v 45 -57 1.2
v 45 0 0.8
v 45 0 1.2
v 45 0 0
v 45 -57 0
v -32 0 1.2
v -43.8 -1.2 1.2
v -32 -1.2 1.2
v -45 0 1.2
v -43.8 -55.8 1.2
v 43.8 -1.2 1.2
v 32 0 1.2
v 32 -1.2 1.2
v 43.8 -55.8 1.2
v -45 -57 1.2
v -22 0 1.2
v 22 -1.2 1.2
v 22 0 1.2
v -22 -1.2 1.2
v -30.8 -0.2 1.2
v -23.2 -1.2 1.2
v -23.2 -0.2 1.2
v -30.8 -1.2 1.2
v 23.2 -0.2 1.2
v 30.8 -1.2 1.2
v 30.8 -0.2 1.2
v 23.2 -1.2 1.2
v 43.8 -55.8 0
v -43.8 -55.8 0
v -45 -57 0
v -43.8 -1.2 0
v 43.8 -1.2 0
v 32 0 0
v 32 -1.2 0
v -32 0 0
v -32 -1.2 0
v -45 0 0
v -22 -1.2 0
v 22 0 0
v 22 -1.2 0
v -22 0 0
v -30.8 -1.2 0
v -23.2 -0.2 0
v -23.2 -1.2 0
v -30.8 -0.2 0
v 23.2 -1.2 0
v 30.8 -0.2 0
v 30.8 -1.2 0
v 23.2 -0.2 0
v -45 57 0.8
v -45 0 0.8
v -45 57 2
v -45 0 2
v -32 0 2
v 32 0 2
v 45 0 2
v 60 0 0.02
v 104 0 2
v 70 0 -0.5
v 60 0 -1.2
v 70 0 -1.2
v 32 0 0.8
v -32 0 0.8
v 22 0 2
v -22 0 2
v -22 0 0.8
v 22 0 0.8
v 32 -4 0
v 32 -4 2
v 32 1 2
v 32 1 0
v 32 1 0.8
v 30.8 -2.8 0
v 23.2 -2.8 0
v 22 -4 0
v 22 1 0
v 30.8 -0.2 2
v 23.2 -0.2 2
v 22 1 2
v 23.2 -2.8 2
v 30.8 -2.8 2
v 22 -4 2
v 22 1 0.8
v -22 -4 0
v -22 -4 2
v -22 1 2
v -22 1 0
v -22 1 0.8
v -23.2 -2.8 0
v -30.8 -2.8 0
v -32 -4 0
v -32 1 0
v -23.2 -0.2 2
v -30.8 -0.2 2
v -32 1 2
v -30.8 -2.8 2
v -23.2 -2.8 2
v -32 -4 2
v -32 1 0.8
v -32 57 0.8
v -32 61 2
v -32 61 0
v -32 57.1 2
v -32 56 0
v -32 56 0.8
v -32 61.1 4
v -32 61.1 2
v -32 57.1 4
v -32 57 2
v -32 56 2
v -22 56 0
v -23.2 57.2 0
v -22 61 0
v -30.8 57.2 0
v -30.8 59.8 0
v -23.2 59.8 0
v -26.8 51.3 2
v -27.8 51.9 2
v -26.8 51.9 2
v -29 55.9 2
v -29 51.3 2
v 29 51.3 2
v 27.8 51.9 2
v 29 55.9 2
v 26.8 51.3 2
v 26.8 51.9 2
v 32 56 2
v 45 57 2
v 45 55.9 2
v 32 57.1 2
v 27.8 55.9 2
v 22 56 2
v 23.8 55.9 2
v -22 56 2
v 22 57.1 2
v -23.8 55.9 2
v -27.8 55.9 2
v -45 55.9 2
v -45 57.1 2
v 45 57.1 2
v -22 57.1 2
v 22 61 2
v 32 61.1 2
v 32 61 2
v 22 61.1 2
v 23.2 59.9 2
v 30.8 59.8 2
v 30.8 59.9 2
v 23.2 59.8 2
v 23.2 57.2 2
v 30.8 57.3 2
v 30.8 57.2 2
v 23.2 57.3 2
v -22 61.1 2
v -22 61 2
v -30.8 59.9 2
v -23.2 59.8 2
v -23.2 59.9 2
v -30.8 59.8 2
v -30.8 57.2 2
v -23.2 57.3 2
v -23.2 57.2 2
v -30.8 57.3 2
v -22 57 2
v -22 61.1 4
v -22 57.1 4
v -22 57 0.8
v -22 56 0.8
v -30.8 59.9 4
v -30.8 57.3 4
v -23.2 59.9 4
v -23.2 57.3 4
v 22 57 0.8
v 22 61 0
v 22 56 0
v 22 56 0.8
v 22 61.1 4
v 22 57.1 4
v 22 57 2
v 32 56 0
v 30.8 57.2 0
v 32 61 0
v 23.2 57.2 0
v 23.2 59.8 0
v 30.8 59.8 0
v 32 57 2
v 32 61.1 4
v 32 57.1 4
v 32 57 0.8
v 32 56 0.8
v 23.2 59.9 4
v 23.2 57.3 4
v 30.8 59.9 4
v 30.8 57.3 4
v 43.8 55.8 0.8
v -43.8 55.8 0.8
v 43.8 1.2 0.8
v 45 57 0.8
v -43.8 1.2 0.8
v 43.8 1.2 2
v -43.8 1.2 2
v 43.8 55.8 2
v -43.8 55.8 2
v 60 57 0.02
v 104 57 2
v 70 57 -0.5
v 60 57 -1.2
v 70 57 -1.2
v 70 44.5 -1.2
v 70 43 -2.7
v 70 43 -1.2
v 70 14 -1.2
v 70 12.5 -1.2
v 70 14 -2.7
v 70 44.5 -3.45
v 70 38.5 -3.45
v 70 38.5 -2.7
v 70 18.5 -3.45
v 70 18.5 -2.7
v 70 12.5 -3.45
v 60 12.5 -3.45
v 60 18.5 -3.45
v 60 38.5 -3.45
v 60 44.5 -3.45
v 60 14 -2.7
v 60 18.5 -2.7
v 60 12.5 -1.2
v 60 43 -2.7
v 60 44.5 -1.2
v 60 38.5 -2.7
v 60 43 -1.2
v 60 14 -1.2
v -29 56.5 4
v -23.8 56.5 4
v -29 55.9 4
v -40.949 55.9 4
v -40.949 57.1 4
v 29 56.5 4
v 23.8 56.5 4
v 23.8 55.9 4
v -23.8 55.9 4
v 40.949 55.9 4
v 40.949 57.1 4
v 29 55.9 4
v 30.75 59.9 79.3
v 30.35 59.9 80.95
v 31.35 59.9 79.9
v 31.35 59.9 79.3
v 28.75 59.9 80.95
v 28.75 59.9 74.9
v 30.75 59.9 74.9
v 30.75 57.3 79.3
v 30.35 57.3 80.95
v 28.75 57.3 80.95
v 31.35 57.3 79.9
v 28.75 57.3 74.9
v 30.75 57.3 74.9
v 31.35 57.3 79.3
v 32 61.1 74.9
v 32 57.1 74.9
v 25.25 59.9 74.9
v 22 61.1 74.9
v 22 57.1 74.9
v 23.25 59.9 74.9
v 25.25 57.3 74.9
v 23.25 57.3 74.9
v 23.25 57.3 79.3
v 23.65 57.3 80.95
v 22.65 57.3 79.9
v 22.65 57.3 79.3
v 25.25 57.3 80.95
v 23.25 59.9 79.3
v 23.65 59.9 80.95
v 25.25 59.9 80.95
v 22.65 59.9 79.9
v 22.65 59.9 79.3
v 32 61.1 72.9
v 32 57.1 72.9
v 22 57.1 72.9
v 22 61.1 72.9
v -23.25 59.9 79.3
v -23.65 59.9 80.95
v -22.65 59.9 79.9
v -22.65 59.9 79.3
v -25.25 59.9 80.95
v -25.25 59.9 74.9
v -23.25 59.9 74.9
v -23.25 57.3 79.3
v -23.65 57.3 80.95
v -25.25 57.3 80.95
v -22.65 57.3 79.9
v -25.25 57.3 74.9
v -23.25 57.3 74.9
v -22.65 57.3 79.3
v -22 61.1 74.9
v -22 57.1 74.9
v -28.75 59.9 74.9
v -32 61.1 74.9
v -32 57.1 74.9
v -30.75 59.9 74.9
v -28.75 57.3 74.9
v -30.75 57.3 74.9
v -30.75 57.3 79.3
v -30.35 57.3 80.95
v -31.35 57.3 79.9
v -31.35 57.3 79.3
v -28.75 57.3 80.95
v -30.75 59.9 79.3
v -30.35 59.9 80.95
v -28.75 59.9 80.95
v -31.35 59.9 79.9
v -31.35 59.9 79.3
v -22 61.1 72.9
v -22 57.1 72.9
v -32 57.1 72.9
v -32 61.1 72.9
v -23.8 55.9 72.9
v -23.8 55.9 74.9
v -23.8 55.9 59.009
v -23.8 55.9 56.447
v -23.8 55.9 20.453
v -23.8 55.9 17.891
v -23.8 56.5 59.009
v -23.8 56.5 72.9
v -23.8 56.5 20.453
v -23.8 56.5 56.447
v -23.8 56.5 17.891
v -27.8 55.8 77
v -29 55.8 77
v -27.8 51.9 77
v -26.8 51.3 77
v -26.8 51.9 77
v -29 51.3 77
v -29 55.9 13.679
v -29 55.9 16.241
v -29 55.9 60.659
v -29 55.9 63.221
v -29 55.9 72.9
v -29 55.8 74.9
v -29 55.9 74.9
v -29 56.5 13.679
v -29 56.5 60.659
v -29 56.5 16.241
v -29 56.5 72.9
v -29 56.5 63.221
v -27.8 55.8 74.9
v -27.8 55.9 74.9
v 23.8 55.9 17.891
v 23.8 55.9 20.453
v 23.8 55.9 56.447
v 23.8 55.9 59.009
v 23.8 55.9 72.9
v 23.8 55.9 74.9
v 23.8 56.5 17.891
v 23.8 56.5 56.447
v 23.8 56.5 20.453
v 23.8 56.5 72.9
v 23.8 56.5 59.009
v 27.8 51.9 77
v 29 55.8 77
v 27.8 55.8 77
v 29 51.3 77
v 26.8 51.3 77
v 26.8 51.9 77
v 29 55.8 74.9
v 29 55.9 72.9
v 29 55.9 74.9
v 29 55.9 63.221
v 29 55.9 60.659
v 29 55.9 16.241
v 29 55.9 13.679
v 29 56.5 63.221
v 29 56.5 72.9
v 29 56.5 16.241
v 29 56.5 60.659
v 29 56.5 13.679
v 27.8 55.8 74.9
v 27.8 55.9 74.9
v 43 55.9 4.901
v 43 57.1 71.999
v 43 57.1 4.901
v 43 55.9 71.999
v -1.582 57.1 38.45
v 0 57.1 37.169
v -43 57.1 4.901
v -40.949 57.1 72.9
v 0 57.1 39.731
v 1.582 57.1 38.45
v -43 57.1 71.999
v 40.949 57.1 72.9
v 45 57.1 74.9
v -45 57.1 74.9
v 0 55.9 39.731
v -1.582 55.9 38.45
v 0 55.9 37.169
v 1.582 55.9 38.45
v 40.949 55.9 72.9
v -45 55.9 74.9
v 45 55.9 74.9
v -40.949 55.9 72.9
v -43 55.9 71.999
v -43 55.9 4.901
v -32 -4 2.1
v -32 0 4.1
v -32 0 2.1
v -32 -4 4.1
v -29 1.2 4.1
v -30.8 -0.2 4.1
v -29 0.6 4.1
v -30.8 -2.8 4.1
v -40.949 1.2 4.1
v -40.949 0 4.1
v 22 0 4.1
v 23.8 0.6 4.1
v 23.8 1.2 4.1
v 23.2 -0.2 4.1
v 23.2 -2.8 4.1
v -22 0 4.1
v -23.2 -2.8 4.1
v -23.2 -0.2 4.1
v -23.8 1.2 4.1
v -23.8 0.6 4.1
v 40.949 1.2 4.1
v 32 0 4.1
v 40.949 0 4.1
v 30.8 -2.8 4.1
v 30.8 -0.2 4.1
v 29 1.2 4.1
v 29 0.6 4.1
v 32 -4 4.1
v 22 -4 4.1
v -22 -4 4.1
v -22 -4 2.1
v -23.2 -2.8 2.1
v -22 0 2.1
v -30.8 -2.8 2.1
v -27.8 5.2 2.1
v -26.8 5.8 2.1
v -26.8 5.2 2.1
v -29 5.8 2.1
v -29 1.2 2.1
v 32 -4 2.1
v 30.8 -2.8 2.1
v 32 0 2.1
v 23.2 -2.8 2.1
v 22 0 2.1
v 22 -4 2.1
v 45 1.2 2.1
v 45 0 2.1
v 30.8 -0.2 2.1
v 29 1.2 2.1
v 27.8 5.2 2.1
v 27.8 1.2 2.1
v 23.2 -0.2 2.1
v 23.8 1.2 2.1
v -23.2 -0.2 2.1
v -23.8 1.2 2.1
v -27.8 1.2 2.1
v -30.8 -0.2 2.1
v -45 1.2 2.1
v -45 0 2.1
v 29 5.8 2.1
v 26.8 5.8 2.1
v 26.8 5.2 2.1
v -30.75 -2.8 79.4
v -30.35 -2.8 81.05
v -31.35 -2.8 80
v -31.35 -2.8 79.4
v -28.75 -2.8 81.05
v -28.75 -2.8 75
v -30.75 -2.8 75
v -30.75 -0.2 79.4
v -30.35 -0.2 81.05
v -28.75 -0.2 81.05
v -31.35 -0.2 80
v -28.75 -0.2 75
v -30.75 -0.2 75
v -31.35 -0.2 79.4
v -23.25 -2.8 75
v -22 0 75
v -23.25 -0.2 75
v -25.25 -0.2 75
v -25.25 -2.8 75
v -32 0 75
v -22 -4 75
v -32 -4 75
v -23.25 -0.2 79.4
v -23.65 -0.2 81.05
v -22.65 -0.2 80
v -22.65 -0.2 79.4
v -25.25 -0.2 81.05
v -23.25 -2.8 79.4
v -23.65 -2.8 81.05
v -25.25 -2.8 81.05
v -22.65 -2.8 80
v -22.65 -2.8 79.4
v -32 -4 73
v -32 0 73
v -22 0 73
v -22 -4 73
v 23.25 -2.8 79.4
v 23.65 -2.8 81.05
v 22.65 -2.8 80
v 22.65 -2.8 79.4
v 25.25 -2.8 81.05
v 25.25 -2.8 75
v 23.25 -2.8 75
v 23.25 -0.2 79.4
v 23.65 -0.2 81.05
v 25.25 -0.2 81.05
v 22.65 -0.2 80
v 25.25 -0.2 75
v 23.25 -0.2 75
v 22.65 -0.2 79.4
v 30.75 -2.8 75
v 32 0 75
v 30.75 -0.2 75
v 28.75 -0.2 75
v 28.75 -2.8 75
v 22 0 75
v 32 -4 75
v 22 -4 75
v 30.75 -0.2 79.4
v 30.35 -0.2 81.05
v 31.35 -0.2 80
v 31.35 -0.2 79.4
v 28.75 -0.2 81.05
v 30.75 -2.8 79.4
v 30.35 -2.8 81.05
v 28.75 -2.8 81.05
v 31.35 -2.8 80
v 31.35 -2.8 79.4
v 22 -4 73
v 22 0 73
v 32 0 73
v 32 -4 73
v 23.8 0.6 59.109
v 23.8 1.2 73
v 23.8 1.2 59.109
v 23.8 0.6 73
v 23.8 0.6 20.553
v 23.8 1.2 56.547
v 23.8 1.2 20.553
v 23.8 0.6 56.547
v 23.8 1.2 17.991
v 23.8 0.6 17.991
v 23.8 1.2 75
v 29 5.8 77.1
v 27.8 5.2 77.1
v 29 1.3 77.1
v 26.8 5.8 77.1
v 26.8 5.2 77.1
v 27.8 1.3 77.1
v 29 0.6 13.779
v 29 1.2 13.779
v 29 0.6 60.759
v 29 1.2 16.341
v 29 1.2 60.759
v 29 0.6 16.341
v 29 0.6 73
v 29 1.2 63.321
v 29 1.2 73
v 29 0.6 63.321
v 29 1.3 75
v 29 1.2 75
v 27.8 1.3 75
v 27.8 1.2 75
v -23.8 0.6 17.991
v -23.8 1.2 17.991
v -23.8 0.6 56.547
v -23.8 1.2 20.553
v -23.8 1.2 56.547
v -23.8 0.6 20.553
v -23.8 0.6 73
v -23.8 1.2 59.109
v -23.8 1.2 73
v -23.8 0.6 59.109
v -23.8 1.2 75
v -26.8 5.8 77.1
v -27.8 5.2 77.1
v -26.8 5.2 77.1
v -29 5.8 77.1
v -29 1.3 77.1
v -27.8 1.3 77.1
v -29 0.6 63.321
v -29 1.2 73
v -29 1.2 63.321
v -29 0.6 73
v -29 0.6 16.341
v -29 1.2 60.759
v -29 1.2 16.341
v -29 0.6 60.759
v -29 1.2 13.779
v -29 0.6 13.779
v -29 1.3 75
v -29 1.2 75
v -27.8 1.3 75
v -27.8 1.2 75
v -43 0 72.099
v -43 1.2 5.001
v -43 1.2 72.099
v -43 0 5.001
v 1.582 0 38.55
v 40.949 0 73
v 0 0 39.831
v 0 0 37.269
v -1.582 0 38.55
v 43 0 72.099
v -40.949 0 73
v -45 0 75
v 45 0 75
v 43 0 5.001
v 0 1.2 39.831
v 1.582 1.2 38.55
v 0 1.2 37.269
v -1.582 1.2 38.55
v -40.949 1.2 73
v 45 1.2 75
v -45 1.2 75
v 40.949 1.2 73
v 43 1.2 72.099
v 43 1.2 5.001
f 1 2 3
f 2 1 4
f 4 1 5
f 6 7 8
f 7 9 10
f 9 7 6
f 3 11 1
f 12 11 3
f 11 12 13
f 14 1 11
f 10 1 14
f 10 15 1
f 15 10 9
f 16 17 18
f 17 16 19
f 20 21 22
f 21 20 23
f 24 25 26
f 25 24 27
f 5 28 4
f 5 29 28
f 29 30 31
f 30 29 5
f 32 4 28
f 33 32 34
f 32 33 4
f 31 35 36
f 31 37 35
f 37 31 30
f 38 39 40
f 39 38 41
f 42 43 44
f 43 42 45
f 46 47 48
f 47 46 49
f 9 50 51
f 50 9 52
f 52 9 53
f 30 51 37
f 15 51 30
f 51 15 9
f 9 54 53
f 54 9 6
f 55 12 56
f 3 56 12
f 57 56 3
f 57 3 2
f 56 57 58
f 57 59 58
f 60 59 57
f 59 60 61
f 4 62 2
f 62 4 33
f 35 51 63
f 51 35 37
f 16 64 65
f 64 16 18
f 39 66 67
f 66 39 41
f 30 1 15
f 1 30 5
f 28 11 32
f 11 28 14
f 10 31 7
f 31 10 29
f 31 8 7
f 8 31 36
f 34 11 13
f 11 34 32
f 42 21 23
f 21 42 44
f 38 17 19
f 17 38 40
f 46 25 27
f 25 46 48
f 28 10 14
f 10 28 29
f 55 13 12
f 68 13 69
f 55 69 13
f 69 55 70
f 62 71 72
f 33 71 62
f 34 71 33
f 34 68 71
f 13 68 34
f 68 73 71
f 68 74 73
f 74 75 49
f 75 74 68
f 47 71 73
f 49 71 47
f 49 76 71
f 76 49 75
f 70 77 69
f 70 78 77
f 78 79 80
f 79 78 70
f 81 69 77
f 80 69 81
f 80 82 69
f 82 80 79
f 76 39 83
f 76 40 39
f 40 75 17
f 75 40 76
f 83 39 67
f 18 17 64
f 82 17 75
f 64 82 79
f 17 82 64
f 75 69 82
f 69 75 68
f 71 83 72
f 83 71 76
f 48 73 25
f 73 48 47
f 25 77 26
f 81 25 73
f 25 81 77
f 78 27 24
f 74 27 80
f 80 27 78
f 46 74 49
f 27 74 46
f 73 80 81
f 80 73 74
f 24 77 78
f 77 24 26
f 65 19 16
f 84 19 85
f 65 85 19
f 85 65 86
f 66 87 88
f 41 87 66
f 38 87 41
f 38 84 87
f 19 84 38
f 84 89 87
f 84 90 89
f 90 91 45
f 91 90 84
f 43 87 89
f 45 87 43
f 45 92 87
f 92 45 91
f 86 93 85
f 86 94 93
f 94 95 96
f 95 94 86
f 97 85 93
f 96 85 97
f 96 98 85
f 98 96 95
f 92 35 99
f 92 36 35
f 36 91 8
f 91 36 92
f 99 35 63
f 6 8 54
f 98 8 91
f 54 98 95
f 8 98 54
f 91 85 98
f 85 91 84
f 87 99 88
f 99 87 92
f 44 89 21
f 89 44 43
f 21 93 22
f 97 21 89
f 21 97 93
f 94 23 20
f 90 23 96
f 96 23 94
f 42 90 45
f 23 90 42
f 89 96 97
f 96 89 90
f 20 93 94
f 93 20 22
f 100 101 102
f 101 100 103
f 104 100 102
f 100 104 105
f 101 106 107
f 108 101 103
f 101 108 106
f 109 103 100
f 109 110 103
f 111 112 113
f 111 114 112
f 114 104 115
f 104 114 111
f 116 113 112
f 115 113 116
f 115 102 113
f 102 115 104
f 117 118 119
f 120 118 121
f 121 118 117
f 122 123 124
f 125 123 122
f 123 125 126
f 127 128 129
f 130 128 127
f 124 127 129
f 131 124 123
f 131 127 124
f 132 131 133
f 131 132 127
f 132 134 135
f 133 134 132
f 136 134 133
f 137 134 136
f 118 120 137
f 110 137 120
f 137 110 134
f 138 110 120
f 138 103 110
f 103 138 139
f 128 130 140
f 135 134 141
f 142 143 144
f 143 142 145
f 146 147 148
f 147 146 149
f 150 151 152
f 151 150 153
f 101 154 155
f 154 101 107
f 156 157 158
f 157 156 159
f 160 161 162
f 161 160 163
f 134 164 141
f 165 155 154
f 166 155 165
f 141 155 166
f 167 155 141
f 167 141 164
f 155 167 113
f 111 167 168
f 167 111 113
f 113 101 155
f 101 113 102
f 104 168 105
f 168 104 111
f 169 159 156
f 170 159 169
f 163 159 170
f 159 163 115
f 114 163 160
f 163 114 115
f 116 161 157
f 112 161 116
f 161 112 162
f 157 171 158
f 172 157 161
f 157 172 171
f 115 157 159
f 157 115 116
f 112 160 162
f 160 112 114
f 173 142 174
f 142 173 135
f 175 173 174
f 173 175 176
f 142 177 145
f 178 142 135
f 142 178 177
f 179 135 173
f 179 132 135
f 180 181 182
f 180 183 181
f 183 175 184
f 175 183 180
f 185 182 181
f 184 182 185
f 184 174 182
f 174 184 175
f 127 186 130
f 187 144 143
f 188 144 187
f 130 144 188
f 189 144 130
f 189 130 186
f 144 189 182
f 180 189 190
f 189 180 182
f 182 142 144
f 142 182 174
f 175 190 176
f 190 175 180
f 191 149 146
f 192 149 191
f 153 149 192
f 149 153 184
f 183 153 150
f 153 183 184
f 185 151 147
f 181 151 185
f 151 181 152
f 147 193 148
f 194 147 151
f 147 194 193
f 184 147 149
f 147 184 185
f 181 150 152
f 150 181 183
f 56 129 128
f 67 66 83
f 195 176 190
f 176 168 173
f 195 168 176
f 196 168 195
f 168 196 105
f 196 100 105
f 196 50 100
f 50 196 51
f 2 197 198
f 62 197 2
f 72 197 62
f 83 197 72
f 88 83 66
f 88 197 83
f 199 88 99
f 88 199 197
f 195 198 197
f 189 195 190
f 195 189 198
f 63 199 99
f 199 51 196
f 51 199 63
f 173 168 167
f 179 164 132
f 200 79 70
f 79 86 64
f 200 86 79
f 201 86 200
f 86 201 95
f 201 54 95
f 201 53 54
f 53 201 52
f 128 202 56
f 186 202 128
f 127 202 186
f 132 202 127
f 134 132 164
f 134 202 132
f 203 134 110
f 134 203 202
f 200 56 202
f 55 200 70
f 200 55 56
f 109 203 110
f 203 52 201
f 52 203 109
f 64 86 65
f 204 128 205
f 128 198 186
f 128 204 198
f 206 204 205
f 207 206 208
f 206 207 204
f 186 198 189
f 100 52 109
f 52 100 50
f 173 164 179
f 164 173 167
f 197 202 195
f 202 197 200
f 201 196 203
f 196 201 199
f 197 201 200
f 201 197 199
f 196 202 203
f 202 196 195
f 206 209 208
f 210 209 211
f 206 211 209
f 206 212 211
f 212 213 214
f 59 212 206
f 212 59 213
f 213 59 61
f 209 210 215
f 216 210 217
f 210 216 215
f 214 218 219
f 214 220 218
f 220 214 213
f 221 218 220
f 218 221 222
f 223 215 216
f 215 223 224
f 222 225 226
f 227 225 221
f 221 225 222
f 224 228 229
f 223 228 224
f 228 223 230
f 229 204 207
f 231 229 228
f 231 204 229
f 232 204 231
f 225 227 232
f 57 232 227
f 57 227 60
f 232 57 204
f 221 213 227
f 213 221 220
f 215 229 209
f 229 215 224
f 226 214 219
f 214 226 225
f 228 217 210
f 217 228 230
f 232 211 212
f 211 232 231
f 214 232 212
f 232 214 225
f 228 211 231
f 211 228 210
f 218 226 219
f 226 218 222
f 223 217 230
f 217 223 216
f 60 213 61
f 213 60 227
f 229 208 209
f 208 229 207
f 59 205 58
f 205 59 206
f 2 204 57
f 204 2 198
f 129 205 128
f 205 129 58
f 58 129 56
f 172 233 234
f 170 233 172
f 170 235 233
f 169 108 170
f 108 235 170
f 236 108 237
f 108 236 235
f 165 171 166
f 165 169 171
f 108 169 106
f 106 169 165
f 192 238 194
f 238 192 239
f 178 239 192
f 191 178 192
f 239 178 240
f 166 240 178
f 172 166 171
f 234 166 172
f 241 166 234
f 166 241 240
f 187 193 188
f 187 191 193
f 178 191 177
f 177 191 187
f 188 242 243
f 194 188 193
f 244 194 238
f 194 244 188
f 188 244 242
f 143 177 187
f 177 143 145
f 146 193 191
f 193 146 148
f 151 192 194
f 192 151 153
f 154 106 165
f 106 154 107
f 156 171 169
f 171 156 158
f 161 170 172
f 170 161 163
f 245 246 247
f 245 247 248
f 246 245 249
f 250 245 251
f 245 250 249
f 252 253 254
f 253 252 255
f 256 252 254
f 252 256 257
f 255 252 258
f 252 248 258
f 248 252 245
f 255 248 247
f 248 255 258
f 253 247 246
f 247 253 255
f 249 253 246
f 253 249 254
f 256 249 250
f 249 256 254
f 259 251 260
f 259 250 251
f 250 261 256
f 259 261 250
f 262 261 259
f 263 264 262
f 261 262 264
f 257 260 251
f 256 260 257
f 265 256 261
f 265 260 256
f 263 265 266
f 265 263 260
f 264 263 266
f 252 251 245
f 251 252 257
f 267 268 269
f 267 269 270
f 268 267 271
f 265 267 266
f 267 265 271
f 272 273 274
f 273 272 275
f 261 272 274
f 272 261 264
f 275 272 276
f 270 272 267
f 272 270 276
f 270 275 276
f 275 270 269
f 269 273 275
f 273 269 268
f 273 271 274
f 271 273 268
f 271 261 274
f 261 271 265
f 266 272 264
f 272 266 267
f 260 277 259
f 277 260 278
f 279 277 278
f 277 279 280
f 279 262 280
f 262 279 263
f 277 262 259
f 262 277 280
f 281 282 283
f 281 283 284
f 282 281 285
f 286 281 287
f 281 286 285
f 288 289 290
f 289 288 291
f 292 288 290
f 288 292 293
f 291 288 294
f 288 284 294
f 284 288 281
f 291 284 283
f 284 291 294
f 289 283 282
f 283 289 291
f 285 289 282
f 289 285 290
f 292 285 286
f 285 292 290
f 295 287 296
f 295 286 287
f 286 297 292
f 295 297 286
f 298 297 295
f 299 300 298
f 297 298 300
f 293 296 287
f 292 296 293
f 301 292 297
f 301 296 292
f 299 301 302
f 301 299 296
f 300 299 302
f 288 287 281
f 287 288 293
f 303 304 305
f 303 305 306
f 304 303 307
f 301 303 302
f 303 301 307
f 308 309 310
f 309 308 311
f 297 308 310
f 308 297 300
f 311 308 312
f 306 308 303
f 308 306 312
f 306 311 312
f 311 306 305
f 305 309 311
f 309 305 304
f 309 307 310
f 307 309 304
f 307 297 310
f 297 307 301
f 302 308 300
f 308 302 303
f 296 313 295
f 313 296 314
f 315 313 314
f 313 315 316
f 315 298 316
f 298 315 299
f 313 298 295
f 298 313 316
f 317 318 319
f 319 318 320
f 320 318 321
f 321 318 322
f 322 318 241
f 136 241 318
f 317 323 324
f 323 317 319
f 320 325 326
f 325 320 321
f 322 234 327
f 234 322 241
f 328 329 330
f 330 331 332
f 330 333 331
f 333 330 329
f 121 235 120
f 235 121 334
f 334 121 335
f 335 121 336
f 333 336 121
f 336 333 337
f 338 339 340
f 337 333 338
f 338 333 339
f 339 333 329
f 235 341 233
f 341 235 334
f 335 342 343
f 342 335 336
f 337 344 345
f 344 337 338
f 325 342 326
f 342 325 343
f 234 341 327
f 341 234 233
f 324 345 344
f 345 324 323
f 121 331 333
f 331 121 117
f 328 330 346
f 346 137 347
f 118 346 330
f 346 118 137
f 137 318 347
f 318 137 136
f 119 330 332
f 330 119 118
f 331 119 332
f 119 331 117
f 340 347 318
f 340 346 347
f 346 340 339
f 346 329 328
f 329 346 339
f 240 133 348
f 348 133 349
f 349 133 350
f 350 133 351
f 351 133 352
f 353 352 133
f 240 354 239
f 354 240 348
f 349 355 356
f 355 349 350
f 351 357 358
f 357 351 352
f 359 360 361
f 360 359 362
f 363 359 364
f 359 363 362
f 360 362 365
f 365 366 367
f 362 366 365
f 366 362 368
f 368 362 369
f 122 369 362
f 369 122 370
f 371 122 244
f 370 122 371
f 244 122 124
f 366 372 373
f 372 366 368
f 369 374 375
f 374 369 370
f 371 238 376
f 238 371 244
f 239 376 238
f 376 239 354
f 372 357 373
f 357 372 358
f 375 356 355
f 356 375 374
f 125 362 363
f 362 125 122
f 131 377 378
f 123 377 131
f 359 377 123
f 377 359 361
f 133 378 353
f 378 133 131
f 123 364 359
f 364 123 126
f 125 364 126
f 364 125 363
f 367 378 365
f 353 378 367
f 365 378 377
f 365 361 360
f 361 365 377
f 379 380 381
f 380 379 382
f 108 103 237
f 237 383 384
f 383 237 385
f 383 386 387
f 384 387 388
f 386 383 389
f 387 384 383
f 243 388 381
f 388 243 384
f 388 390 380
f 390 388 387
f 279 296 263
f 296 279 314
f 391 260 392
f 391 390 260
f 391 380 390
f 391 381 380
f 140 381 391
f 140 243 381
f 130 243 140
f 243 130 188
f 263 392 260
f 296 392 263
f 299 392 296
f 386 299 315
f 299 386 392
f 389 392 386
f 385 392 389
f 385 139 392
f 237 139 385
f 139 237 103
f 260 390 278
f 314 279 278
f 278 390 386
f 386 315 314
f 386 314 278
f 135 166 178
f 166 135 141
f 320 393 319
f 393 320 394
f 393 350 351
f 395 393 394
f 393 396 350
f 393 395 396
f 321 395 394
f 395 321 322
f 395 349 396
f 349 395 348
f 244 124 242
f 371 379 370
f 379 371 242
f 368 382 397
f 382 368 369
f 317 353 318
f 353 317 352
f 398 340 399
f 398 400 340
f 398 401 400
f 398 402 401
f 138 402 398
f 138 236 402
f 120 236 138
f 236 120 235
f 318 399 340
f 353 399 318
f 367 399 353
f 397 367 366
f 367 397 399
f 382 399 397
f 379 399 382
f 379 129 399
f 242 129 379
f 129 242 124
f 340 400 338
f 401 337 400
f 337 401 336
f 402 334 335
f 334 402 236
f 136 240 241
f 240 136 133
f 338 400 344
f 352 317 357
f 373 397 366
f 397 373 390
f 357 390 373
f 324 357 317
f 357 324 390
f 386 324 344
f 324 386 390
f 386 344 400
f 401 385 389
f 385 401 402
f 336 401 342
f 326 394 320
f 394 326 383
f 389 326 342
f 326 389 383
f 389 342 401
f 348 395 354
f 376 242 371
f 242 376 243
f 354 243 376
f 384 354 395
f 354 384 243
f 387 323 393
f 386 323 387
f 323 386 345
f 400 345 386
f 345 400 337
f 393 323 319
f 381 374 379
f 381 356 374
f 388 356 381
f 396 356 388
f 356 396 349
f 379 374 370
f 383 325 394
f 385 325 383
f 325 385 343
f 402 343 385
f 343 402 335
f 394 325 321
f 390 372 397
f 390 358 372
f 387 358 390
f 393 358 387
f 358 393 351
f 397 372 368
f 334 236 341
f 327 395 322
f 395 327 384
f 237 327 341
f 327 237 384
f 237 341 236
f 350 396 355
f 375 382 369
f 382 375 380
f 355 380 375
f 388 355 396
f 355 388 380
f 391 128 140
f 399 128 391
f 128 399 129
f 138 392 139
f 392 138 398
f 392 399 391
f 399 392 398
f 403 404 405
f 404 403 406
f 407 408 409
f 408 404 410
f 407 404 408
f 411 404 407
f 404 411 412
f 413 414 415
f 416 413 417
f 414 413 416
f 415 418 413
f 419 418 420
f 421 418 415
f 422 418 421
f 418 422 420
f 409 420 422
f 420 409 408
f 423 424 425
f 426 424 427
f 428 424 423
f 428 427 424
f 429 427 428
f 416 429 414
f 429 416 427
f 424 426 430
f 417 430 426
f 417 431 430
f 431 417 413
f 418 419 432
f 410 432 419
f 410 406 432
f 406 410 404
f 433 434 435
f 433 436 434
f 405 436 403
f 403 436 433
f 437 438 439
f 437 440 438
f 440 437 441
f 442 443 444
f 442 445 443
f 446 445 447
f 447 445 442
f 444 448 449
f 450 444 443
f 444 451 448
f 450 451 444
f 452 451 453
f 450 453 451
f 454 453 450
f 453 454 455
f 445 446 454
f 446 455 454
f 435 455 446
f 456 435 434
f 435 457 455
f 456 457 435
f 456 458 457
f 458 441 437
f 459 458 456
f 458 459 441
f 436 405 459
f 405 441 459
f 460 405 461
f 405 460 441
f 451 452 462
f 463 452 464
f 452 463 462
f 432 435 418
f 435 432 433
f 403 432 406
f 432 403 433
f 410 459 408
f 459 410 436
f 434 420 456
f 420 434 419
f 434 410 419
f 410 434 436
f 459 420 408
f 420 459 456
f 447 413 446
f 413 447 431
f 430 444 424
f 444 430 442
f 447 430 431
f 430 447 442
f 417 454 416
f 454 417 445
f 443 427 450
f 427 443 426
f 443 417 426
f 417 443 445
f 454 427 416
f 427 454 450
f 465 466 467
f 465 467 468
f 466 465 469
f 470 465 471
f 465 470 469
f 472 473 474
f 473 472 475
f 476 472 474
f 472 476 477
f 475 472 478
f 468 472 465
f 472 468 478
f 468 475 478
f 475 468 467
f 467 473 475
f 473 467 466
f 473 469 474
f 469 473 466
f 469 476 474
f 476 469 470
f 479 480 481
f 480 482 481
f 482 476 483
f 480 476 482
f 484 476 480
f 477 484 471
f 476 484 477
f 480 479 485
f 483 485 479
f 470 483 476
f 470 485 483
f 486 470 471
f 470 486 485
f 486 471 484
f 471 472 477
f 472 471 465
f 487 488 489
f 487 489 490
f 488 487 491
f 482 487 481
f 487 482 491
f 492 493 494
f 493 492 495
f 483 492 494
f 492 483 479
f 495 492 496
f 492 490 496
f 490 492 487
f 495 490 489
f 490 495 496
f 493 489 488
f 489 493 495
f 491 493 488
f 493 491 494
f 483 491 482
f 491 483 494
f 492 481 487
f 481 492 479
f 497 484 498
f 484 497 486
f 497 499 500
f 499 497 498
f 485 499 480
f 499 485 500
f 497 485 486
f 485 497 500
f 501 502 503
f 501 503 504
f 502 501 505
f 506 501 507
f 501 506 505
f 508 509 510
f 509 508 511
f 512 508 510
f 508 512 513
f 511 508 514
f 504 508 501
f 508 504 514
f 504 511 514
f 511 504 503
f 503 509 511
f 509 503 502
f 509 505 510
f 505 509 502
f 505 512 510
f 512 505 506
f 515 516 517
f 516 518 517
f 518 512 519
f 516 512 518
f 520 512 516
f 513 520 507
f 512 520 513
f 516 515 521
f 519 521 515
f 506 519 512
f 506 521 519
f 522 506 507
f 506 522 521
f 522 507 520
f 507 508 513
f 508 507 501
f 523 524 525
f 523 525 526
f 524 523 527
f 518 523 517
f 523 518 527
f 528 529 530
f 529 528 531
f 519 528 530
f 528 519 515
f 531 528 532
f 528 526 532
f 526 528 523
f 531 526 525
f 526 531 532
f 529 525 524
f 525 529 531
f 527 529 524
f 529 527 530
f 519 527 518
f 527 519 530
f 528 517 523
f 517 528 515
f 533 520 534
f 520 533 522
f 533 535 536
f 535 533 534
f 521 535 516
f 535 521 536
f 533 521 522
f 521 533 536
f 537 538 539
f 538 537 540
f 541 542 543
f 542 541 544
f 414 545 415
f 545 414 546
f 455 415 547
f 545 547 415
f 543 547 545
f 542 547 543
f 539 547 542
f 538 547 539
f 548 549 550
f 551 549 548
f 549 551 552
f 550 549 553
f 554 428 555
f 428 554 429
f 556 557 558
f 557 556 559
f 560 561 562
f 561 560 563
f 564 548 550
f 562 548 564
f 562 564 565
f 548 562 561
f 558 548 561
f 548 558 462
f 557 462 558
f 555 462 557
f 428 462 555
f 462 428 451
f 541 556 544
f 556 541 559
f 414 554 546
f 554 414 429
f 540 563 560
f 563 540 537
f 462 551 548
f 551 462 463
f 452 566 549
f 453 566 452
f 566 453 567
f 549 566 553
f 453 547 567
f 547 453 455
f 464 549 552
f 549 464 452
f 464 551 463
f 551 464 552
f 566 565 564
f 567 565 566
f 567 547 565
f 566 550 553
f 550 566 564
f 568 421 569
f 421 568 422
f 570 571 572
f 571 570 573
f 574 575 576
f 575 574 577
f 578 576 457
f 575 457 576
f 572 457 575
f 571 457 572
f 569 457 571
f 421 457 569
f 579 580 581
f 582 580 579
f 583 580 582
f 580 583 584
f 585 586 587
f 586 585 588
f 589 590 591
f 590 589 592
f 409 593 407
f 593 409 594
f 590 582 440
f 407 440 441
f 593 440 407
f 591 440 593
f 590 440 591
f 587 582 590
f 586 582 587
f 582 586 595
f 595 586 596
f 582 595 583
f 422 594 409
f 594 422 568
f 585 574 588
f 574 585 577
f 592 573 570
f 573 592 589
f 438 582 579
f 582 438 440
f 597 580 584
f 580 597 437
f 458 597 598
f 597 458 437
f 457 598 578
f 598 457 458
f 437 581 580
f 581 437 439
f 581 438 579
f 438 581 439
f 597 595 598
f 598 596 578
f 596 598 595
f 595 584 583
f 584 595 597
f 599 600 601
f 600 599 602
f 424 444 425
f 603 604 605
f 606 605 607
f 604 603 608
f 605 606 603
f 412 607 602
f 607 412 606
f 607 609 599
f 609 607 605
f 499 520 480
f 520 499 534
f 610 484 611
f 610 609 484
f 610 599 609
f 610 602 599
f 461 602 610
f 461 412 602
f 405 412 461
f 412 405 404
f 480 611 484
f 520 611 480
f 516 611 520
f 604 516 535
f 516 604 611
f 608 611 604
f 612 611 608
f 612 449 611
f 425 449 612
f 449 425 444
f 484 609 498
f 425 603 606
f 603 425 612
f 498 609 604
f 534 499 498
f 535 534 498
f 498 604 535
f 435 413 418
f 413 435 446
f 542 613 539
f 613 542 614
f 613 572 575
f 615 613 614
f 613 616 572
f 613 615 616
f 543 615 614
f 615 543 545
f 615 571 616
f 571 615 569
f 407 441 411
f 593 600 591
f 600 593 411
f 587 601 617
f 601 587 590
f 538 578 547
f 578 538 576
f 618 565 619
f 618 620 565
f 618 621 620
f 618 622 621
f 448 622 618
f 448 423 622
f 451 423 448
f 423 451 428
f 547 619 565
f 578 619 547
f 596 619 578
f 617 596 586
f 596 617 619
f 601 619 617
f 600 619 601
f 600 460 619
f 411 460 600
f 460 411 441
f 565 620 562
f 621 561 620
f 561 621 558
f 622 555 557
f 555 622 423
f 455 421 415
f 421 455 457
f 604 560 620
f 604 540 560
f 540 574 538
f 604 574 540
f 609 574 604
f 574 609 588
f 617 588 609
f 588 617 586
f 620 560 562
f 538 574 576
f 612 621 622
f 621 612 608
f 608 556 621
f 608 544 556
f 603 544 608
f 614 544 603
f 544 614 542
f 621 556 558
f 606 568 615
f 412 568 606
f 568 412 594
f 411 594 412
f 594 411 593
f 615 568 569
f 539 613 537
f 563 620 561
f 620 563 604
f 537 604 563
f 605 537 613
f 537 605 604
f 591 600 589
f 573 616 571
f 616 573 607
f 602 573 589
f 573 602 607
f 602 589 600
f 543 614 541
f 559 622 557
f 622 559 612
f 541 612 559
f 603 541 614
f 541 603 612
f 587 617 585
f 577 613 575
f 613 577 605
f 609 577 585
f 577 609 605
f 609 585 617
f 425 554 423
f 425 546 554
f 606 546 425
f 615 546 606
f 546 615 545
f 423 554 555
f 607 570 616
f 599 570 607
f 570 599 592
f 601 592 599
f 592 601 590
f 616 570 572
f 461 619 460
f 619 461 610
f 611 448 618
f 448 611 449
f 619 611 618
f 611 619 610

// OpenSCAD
module attachment(type="plug",extraL=0) {
    dim_x=10;
    dim_y=5;
    dim_z=2;
    e=.1/2;
    plug_z=dim_z+2;
    W=1.2;
    plug_w=2;
    plug_a=.6;
    plug_mid=dim_z+4*e+.2;
    
    module pole(){
        translate([plug_w,0,extraL])
        rotate(90,[1,0,0])
        color([0,1,0]){
            linear_extrude(height=dim_y-2*W,  slices=20, twist=0,center=true)
          polygon(points=[[0,-extraL],[0,plug_mid],[plug_a,plug_mid],
                    [plug_a,plug_z+e],
                    [plug_a,plug_z-1],
                    [plug_a-1,plug_z+e],
                    [-plug_w,plug_z+e],
                    [-plug_w,-extraL]
                ]);
            }
    }

if(true){
translate([0,dim_y/2,0])
    translate([0,-1,0])
    if(type == "plug"){
        k=dim_x/2-W-e-plug_w;
        translate([k,0,0])
        pole();
        translate([-k,0,0])
        rotate(180,[0,0,1])
        pole();
        translate([0,0,-dim_z/2])
        cube([dim_x,dim_y,dim_z],center=true);
    }else{
        color([1.0,0,0])
        translate([0,0,dim_z/2])
        difference() {
            cube([dim_x,dim_y,dim_z],center=true);
            cube([dim_x-2*W,dim_y-2*W,dim_z*2],center=true);
        }
    }
}   else{
    H=dim_z;
    D=5;
    SCREW_D=3;
    translate([0,D/3,H/2])
    difference() {
        hull() {
            cylinder($fn=6,d=D,h=H,center=true);
            translate([0,-D/3,0])
            cube([2*D,e,H],center=true);
        }
        cylinder($fn=32,d=SCREW_D,h=2*H,center=true);
    }
}    
}

//attach_O();
//a=2;

module testAttach() {
translate([0,2.5,1])
cube([10,4,2],center=true);
translate([0,0,2])
attachment("plug",2);

if(true) 
    {
translate([0,7,0])
attachment(2);
translate([0,-7,0])
attachment(2);
}
}


FLOOR=75;
e=.1;
STAGE_H=2;
K=57;
L=90;
W=1.2;
SA=L*.6/2;

RAIL_O=4;

module wallElement(){ 
    EH=FLOOR-e-STAGE_H;
    
    translate([SA,0,0])
    attachment("socket");
    translate([-SA,0,0])
    attachment("socket");
  
    
    translate([SA,0,EH])
    attachment("plug",STAGE_H);
    translate([-SA,0,EH])
    attachment("plug",STAGE_H);
    
    
    module rail(){
        translate([-RAIL_O/2,-RAIL_O-W/2,0])
//    rotate(180,[0,0,1])
        difference() {
        cube([RAIL_O+W,RAIL_O+W,FLOOR]);
        translate([W,W/2,-1])
        cube([2*SA,RAIL_O,FLOOR+STAGE_H]);
        translate([W+1,-1,-1])
        cube([2*SA,RAIL_O,FLOOR+STAGE_H]);
            translate([-.1,RAIL_O+W/2-.1,EH])
        cube([RAIL_O*2,RAIL_O,RAIL_O]);
    }

    }
    
    translate([-SA,-W,0])
    rail();

    translate([SA,-W,0])
    //rotate(180,[0,0,1])
    mirror([1,0,0])
    rail();

/*    
    translate([0,-W,0])
    rotate(180,[0,0,1])
    difference(){
    cube([RAIL_O+W,RAIL_O+W,FLOOR]);
    cube([RAIL_O,RAIL_O,2*FLOOR]);
    }
  */  
    p=  [
            [L/2,0,0],
            [L/2,EH,0],
            [-L/2,EH,0],
            [-L/2,0,0]];
    
    module rx(p,i,j,d) {
        $fn=32;
        hull() {
            translate(p[i]) cylinder(d=d,h=W);
            translate(p[j])cylinder(d=d,h=W);
        }
    }

    rotate(90,[1,0,0])
    intersection() {
        translate([-L/2,0,-10])
        cube([L,EH+eps*5,20]);
        union(){
            
    rx(p,0,1,4);
            hull(){
//            translate([0,W,-W*1.5])
    rx(p,1,2,4);
    rx(p,1,2,4);}
    rx(p,2,3,4);
    rx(p,3,0,4);
    rx(p,0,2,2);
    rx(p,1,3,2);
        }
    }
//    difference() {
//    linear_extrude(height=2) polygon(p);
  //  linear_extrude(center=true) offset(r=-1) polygon([p[0],p[1],p[2]]);
    //}
    
    
//    translate([
}
eps=1e-5;
module floorElement(){
    translate([SA,-eps,0])
    attachment("socket");
    translate([-SA,-eps,0])
    attachment("socket");
        
    translate([0,-K,0])
    rotate(180,[0,0,1]){
    translate([SA,-eps,0])
    attachment("socket");
    translate([-SA,-eps,0])
    attachment("socket");
    }
    
    translate([0,-K/2,W/2])
    difference(){
    cube([L,K,W],center=true);
    cube([L-2*W,K-2*W,W*5],center=true);
    }
    CONN_L0=10;
    CONN_L=25;

    CONN_H=2.5;
    CONN_T=34;
    
    translate([L/2,-K,0]) {
    color([1,0,1])
        difference() {
            pp=[[0,CONN_H-W],[CONN_L,0],[CONN_L+CONN_T,CONN_H],[0,CONN_H]];
            translate([0,0,CONN_H])
            rotate(-90,[1,0,0])
            linear_extrude(K)
                polygon(pp);
//            cube([CONN_L+CONN_T,K,CONN_H]);
        }
    }
    translate([L/2+CONN_L-CONN_L0,-K,CONN_H]) {
    color([1,0,0])
        translate([0,0,-1])
        cube([CONN_L0,K,1.7]);
        translate([CONN_L0/2,K/2,0.7+1.5/2])
        difference() {
    color([0,1,0])
        cube([CONN_L0,32,3.0],center=true);
        cube([32,29,1.5],center=true);
            translate([0,0,1])
        cube([32,20,1.5],center=true);
        }
        
    }
    
}


module car(){
    translate([0,-K/2,W/2])
    difference(){
    cube([L,K,W],center=true);
    cube([L-2*W,K-2*W,W*5],center=true);
    }
    
}

//testAttach();
//rotate(90,[1,0,0]) 

module preview() {
    translate([0,0,2])
    rotate(180,[1,0,0])
    floorElement();
    
    translate([0,K+e,2])
    wallElement();
    translate([0,0,2+e])
    rotate(180,[0,0,2])
    wallElement();
    
    car();

}


//wallElement();
preview();
